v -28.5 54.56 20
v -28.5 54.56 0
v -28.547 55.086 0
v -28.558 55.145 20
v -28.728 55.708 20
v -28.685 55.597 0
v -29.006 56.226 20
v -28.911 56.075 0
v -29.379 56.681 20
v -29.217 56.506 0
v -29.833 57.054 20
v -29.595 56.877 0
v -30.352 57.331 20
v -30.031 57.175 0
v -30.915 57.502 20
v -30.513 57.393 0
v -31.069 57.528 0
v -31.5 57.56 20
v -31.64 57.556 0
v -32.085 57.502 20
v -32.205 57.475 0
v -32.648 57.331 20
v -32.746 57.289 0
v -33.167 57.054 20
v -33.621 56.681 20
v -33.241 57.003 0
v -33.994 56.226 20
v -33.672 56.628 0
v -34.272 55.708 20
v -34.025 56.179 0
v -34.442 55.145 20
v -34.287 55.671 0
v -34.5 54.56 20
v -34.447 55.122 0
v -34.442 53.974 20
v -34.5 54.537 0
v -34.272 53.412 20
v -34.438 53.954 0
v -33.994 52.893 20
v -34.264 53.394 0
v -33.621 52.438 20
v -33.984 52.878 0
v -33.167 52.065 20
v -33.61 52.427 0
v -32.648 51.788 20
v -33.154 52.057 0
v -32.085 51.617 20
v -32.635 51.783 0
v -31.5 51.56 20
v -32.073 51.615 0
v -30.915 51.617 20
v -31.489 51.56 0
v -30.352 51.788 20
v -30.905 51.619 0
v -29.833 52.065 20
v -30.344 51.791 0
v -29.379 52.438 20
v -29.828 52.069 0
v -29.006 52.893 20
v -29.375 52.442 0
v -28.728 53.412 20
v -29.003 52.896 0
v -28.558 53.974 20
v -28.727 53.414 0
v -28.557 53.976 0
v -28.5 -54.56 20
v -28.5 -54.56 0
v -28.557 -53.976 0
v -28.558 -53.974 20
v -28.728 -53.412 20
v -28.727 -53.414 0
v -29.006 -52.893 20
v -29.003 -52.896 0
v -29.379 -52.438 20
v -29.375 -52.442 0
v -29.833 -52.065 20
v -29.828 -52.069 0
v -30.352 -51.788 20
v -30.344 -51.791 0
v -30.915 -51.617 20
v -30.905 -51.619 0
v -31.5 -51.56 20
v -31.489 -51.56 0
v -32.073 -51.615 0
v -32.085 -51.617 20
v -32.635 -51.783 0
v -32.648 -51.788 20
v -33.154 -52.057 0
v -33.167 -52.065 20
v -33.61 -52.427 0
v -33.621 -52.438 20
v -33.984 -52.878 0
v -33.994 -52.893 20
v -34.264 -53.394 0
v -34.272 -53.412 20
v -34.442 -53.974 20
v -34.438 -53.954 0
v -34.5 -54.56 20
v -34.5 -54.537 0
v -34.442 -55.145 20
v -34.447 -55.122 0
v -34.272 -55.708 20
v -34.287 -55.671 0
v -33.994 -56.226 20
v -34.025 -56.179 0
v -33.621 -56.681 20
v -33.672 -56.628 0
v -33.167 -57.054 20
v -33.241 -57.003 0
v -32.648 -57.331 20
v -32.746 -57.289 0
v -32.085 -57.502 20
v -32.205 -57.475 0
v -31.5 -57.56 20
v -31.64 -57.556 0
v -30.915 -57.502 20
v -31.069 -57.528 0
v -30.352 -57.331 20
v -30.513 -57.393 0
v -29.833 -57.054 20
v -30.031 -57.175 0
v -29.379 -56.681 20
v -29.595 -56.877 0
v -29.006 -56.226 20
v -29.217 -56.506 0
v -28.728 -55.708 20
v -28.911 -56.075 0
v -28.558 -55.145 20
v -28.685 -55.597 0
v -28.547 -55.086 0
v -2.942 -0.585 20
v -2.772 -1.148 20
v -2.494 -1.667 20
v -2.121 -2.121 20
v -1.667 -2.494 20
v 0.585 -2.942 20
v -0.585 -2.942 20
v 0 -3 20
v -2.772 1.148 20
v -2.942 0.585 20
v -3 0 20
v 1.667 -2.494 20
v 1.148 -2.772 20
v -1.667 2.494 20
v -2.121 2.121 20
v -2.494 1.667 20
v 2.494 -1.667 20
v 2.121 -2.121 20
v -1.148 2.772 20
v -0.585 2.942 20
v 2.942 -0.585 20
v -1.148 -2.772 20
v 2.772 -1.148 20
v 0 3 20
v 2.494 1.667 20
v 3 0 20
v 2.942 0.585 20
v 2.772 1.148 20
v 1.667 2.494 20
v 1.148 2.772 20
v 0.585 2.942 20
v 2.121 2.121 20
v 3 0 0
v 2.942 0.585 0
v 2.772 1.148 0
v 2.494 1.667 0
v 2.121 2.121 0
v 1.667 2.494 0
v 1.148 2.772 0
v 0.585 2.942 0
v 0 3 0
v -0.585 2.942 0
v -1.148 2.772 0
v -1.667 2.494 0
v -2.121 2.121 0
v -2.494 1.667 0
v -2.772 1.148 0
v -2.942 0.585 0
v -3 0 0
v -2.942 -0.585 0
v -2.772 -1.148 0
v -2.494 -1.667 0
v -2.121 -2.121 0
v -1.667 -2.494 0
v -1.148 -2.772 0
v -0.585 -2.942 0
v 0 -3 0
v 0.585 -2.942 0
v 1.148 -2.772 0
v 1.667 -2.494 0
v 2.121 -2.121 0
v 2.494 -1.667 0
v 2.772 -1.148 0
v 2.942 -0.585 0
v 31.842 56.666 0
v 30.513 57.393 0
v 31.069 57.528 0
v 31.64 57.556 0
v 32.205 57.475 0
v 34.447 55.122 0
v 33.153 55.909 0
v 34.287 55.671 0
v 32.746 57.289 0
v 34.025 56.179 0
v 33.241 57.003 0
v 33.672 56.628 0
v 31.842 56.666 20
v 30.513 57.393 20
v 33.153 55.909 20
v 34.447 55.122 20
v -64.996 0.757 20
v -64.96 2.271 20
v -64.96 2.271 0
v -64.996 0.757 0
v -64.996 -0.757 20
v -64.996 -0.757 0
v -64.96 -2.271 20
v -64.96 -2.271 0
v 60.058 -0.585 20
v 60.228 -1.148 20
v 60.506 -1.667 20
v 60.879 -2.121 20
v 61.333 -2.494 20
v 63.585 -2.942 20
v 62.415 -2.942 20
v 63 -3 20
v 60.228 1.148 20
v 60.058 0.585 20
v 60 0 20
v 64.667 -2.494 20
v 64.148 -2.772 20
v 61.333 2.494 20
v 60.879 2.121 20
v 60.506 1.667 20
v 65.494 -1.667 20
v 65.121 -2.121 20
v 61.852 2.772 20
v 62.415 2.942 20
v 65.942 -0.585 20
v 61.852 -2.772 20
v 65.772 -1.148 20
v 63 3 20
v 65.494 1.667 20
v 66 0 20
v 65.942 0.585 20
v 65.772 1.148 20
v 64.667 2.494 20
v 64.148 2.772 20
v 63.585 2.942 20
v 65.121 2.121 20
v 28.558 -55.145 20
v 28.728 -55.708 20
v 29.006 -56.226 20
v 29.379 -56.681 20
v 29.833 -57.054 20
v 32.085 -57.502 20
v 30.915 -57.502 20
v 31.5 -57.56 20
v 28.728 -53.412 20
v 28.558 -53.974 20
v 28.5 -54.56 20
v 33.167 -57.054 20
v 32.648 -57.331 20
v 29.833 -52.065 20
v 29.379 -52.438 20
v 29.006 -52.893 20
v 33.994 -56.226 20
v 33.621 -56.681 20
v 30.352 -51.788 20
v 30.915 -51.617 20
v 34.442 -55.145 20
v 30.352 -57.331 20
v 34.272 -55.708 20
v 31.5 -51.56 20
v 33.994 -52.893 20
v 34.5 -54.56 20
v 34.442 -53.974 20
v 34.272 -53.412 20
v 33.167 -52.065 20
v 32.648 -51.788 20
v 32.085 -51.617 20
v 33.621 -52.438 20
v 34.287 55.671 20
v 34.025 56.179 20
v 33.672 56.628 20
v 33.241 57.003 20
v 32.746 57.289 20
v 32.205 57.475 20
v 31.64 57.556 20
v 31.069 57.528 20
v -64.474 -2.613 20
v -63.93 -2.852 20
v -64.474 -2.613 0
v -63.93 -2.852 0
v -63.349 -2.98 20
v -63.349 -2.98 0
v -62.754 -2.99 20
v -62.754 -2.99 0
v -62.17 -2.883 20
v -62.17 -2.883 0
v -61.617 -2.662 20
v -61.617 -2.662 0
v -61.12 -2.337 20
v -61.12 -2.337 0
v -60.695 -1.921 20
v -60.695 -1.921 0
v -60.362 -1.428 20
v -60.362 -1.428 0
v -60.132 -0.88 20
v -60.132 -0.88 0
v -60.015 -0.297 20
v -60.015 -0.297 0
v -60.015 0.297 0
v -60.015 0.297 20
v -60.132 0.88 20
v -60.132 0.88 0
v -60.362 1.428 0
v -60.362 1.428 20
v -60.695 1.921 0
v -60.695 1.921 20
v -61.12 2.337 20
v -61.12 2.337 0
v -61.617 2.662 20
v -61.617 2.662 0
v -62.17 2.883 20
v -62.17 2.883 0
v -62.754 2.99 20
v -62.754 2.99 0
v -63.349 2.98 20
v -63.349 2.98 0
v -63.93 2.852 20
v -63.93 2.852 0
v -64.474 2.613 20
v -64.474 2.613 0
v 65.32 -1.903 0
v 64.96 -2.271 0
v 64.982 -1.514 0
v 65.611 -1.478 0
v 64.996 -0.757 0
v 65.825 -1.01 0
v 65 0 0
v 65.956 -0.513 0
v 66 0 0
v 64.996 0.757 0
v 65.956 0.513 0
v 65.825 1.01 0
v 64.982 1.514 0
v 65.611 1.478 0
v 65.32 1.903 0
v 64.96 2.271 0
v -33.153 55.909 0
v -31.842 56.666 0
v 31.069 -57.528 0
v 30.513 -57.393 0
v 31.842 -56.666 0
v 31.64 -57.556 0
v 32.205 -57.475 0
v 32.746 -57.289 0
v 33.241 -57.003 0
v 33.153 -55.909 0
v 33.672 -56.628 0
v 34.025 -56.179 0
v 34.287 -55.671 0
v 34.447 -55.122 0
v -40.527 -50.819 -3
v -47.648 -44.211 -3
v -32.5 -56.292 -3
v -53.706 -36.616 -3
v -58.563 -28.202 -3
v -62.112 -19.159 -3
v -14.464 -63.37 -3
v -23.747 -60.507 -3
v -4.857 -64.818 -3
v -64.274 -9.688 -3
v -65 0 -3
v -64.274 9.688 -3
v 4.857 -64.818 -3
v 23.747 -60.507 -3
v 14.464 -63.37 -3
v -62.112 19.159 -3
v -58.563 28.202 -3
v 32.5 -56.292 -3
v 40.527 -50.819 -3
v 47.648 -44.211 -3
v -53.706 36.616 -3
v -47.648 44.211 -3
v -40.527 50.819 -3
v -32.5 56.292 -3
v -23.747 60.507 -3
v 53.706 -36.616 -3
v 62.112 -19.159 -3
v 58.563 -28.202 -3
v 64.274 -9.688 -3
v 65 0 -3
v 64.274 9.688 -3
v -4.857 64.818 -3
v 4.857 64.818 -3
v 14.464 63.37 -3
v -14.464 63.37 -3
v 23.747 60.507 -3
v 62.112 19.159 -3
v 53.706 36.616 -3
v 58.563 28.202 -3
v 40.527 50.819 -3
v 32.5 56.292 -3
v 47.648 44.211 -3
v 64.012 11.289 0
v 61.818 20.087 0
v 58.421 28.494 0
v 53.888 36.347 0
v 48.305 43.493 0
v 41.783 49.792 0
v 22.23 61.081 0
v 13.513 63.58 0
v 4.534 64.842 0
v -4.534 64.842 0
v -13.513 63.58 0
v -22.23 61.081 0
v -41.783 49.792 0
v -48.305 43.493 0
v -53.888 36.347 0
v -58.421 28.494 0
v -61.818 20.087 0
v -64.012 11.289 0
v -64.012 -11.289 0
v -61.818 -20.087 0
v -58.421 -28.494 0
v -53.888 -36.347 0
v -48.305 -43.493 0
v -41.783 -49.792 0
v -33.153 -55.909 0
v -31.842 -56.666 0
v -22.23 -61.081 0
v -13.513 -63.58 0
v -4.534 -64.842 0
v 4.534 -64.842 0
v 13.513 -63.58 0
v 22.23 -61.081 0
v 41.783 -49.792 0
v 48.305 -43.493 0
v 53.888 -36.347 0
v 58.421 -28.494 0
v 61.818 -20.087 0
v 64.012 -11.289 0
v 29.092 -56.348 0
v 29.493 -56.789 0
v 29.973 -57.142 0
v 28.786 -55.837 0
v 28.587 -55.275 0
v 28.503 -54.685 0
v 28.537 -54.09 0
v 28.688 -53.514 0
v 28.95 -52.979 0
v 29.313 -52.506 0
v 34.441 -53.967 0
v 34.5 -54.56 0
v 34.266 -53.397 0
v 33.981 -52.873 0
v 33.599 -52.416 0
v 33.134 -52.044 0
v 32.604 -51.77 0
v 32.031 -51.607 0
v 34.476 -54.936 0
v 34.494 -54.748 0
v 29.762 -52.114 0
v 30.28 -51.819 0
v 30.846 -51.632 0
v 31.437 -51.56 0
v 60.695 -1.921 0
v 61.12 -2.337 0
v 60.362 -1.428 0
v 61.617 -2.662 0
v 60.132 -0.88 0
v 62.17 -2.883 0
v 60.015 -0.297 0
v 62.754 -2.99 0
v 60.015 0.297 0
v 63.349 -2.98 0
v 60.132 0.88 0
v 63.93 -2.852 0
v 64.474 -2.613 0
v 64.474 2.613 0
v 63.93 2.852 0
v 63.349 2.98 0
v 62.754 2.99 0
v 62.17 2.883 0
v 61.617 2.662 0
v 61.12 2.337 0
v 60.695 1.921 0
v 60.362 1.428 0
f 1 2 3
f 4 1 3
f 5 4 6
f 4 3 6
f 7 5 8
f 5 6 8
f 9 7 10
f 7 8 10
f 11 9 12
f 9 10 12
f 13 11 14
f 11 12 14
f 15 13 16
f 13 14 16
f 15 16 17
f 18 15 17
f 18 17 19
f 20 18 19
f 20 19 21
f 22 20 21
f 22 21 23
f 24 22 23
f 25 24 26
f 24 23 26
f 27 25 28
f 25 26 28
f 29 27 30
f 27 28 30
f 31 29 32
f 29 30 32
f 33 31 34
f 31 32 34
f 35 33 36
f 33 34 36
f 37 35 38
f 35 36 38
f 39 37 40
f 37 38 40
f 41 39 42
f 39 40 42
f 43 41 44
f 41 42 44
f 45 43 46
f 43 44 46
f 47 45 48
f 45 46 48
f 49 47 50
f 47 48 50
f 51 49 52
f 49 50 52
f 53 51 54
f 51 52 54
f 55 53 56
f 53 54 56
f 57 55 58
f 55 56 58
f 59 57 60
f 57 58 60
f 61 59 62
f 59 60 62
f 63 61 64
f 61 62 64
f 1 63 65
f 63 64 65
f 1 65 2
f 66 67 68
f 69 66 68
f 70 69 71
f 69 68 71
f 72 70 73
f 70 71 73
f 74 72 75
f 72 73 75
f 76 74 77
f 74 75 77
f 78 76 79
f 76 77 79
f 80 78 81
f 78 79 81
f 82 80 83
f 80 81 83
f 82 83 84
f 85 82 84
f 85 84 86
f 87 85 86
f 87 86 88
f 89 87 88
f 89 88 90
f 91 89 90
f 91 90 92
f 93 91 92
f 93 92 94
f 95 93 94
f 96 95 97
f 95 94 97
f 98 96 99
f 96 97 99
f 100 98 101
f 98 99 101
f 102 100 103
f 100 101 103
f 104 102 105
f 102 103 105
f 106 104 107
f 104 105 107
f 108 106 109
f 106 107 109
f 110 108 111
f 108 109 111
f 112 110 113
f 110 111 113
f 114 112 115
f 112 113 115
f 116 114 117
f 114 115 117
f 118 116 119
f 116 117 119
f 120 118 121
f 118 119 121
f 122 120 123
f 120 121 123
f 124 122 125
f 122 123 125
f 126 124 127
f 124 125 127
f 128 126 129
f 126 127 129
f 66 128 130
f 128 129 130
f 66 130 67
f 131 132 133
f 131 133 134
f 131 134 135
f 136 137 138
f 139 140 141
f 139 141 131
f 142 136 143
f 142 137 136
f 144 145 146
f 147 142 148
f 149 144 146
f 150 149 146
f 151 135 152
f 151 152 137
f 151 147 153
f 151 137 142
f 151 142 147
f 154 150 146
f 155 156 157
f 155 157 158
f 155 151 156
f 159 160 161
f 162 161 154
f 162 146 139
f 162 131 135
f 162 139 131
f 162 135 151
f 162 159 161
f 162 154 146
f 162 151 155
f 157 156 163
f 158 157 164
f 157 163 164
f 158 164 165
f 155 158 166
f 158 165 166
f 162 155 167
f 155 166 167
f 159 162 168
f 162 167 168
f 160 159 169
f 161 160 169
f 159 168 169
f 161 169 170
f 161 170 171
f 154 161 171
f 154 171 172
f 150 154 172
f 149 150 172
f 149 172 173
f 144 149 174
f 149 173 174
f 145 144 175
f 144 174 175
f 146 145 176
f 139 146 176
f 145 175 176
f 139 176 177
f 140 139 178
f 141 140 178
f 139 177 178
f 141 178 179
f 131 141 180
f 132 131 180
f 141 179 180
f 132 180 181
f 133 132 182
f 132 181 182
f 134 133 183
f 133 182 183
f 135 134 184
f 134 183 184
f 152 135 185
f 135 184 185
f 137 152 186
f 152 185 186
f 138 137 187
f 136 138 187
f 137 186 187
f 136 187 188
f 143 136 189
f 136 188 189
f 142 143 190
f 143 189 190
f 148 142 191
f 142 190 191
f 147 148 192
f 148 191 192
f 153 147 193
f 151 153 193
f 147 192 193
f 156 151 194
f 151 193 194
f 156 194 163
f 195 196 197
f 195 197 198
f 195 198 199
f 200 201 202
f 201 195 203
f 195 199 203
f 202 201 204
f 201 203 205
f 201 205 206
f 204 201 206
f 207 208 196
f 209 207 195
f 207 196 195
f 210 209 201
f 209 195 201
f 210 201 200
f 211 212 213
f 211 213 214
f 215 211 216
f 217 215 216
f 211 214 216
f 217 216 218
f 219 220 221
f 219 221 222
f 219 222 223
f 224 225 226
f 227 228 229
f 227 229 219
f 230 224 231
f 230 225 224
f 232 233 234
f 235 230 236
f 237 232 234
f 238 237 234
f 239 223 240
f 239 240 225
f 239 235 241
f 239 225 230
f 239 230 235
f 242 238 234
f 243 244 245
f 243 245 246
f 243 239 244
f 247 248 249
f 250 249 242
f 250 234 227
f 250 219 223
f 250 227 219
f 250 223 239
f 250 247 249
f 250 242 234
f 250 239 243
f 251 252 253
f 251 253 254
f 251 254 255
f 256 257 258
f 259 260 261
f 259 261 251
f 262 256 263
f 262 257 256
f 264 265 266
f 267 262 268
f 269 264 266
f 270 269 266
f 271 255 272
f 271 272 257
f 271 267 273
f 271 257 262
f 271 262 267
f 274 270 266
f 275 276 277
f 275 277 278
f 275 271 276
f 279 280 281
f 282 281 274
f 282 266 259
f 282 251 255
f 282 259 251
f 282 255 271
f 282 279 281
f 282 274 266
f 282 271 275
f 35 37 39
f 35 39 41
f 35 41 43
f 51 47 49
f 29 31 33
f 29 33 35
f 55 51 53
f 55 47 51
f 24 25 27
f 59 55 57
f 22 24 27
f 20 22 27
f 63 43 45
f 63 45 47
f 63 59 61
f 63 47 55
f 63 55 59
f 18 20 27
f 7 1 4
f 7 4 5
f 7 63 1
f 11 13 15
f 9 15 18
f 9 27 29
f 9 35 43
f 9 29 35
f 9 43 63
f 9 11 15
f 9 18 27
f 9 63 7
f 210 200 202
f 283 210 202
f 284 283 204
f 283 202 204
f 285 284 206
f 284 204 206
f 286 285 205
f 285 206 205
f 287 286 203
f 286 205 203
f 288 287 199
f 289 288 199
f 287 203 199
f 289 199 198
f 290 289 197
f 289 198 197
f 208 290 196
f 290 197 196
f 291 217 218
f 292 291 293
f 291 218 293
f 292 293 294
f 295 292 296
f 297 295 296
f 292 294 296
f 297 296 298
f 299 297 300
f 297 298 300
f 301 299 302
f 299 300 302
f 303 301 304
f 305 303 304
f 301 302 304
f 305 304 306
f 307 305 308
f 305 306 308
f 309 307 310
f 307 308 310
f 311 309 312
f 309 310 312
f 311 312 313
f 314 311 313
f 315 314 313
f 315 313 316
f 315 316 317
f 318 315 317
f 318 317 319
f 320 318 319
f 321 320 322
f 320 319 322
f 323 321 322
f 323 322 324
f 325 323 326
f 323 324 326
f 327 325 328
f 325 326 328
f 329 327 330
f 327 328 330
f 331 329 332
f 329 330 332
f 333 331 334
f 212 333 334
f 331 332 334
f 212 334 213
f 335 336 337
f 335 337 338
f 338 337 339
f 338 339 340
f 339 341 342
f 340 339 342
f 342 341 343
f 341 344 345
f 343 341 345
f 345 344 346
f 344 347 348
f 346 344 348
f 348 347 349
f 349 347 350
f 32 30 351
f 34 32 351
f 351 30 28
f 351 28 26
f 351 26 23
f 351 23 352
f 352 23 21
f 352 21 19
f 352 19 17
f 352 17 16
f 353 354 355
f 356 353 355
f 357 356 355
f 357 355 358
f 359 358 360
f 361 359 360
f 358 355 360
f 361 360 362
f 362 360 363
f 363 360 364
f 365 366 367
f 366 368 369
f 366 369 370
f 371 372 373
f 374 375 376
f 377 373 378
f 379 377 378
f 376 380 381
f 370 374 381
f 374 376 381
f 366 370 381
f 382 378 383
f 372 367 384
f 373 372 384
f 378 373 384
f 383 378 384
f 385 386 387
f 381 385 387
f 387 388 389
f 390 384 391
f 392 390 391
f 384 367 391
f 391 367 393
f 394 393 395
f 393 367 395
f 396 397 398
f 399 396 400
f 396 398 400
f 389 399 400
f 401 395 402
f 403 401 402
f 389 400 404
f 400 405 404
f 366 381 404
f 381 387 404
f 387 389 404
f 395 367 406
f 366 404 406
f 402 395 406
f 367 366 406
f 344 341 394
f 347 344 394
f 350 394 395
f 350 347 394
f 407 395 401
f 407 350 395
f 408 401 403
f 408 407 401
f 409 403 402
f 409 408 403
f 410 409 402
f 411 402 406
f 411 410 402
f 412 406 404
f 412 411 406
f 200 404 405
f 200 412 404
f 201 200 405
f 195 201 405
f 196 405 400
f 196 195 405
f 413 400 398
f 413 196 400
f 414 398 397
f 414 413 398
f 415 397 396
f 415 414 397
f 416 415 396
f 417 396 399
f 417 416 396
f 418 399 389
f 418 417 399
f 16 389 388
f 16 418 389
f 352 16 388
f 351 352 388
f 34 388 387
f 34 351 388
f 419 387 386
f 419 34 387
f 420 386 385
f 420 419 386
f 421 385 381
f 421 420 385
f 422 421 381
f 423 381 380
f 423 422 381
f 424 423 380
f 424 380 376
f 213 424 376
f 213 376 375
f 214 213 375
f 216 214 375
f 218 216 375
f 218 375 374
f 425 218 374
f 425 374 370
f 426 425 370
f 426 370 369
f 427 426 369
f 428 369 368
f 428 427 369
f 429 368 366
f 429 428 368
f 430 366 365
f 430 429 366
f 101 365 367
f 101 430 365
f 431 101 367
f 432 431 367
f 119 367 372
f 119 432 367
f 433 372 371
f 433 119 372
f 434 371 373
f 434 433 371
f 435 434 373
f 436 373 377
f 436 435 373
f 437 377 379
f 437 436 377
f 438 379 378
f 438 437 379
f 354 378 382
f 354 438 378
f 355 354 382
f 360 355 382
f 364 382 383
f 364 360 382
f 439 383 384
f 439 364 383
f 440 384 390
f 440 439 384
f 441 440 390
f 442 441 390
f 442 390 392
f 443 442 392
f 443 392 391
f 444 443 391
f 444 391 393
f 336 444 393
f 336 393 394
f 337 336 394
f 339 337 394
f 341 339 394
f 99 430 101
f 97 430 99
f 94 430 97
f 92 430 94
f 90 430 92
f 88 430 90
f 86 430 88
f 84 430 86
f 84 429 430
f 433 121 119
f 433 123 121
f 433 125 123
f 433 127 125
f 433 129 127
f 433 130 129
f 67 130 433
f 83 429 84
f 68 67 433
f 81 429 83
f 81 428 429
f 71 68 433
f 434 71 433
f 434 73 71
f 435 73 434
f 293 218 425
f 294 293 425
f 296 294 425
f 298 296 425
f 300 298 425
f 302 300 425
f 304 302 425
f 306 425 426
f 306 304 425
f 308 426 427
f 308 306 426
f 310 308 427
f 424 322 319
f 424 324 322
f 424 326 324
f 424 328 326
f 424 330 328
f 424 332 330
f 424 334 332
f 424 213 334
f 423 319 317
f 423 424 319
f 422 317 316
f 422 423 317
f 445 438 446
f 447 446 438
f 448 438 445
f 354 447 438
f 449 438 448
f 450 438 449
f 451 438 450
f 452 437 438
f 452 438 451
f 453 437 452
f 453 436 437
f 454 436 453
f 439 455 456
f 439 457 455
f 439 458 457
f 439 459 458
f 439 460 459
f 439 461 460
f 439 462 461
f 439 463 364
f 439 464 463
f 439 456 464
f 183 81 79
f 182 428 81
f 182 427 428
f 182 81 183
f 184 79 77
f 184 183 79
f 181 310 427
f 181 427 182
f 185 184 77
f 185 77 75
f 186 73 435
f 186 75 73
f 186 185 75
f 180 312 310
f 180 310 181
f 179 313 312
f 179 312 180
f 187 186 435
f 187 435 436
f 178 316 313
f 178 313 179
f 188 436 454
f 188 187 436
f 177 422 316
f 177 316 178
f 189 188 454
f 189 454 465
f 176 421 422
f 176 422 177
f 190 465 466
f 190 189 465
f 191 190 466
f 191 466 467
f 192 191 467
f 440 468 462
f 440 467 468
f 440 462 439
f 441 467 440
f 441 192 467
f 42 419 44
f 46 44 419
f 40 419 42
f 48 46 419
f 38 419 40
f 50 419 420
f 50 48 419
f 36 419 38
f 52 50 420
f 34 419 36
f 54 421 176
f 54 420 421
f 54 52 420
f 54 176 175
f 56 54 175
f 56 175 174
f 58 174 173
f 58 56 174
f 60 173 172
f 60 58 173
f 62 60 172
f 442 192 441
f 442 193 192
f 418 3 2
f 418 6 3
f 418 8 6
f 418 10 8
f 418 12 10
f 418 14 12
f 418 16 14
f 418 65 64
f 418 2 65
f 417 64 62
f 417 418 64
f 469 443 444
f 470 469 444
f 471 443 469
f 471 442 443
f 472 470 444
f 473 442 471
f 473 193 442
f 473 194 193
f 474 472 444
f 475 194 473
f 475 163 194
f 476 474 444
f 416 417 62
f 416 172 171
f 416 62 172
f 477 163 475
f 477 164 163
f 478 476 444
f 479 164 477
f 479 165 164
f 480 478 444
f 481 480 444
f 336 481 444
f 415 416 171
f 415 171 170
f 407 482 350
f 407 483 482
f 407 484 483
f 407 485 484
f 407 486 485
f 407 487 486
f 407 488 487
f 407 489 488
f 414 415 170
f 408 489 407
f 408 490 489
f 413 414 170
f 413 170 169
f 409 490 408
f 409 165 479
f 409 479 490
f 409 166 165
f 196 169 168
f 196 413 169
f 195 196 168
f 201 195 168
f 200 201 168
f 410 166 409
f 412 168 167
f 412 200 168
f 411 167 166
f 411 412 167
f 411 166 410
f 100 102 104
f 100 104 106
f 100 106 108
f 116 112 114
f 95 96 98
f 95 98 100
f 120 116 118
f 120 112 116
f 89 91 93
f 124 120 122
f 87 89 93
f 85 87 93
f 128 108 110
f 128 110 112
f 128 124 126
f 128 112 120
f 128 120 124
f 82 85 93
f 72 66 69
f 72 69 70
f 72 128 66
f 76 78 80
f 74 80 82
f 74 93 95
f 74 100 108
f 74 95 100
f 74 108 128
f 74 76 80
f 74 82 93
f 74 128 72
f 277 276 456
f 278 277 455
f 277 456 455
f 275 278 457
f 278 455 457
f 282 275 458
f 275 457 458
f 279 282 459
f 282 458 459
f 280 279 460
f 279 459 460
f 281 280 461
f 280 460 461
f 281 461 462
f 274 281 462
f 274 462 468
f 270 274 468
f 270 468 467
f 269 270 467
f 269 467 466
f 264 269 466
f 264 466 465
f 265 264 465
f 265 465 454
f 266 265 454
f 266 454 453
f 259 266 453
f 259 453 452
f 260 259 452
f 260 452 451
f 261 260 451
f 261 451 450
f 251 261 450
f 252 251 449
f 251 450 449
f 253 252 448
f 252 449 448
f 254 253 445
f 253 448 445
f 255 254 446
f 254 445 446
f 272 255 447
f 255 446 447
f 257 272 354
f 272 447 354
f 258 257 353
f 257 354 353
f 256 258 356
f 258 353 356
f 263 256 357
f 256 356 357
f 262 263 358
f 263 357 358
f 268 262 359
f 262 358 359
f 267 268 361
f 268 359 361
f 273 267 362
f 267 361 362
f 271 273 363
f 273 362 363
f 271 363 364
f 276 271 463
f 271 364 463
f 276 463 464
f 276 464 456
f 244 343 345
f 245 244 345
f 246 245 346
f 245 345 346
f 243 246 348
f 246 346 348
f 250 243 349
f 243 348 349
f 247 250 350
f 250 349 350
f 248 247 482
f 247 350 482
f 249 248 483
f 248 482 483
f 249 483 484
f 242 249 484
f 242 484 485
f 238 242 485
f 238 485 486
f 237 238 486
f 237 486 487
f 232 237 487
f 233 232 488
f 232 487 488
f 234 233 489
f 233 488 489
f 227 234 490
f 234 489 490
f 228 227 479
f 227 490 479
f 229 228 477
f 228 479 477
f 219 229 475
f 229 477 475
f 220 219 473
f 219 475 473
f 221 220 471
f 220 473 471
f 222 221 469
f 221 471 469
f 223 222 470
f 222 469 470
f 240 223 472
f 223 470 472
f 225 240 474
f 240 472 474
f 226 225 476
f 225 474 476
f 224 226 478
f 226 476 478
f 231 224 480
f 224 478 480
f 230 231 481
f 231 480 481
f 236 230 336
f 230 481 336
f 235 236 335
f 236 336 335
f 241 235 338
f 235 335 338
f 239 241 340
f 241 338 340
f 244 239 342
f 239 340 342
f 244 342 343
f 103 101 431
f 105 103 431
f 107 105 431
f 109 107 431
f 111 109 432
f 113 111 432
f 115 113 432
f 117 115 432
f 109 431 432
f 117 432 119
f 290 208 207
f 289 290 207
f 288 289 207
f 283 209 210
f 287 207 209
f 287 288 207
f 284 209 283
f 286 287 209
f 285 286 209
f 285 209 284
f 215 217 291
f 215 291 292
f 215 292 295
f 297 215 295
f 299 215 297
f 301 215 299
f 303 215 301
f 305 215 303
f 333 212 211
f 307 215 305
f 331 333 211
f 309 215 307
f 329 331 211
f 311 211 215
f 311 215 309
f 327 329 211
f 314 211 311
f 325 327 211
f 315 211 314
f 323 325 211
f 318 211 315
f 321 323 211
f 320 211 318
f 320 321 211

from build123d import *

# Parameters (mm, degrees)
SKETCH_1_R          = 65
EXTRUDE_1_DEPTH     = 3
EXTRUDE_2_OUTLINE_R = 3
EXTRUDE_2_DEPTH     = 20
SKETCH_3_R          = 3
EXTRUDE_3_DEPTH     = 20


# Read off the part's stored shape, not the designer's step: 凸台-拉伸2
with BuildPart() as part:
    # 草图1 → 凸台-拉伸1 (new body)
    with BuildSketch(Plane.XY):
        Circle(SKETCH_1_R)
    extrude(amount=-EXTRUDE_1_DEPTH)

    # 凸台-拉伸2 outline → 凸台-拉伸2 (add)
    with BuildSketch(Plane.XY):
        with BuildLine():
            ThreePointArc((34.446847976, 55.121816593), (33, 57.15767665), (30.513469484, 57.392753724))
            ThreePointArc((30.513469484, 57.392753724), (32.5, 56.291651246), (34.446847976, 55.121816593))
        make_face()
        with Locations((-31.5, 54.559600438)):
            Circle(EXTRUDE_2_OUTLINE_R)
        with Locations((63, 0)):
            Circle(EXTRUDE_2_OUTLINE_R)
        with BuildLine():
            ThreePointArc((-64.96031746, -2.270937131), (-60, 0), (-64.96031746, 2.270937131))
            ThreePointArc((-64.96031746, 2.270937131), (-65, 0), (-64.96031746, -2.270937131))
        make_face()
        with Locations((31.5, -54.559600438)):
            Circle(EXTRUDE_2_OUTLINE_R)
        with Locations((-31.5, -54.559600438)):
            Circle(EXTRUDE_2_OUTLINE_R)
    extrude(amount=EXTRUDE_2_DEPTH)

    # 草图3 → 凸台-拉伸3 (add)
    with BuildSketch(Plane.XY):
        Circle(SKETCH_3_R)
    extrude(amount=EXTRUDE_3_DEPTH)


solid = part.part
